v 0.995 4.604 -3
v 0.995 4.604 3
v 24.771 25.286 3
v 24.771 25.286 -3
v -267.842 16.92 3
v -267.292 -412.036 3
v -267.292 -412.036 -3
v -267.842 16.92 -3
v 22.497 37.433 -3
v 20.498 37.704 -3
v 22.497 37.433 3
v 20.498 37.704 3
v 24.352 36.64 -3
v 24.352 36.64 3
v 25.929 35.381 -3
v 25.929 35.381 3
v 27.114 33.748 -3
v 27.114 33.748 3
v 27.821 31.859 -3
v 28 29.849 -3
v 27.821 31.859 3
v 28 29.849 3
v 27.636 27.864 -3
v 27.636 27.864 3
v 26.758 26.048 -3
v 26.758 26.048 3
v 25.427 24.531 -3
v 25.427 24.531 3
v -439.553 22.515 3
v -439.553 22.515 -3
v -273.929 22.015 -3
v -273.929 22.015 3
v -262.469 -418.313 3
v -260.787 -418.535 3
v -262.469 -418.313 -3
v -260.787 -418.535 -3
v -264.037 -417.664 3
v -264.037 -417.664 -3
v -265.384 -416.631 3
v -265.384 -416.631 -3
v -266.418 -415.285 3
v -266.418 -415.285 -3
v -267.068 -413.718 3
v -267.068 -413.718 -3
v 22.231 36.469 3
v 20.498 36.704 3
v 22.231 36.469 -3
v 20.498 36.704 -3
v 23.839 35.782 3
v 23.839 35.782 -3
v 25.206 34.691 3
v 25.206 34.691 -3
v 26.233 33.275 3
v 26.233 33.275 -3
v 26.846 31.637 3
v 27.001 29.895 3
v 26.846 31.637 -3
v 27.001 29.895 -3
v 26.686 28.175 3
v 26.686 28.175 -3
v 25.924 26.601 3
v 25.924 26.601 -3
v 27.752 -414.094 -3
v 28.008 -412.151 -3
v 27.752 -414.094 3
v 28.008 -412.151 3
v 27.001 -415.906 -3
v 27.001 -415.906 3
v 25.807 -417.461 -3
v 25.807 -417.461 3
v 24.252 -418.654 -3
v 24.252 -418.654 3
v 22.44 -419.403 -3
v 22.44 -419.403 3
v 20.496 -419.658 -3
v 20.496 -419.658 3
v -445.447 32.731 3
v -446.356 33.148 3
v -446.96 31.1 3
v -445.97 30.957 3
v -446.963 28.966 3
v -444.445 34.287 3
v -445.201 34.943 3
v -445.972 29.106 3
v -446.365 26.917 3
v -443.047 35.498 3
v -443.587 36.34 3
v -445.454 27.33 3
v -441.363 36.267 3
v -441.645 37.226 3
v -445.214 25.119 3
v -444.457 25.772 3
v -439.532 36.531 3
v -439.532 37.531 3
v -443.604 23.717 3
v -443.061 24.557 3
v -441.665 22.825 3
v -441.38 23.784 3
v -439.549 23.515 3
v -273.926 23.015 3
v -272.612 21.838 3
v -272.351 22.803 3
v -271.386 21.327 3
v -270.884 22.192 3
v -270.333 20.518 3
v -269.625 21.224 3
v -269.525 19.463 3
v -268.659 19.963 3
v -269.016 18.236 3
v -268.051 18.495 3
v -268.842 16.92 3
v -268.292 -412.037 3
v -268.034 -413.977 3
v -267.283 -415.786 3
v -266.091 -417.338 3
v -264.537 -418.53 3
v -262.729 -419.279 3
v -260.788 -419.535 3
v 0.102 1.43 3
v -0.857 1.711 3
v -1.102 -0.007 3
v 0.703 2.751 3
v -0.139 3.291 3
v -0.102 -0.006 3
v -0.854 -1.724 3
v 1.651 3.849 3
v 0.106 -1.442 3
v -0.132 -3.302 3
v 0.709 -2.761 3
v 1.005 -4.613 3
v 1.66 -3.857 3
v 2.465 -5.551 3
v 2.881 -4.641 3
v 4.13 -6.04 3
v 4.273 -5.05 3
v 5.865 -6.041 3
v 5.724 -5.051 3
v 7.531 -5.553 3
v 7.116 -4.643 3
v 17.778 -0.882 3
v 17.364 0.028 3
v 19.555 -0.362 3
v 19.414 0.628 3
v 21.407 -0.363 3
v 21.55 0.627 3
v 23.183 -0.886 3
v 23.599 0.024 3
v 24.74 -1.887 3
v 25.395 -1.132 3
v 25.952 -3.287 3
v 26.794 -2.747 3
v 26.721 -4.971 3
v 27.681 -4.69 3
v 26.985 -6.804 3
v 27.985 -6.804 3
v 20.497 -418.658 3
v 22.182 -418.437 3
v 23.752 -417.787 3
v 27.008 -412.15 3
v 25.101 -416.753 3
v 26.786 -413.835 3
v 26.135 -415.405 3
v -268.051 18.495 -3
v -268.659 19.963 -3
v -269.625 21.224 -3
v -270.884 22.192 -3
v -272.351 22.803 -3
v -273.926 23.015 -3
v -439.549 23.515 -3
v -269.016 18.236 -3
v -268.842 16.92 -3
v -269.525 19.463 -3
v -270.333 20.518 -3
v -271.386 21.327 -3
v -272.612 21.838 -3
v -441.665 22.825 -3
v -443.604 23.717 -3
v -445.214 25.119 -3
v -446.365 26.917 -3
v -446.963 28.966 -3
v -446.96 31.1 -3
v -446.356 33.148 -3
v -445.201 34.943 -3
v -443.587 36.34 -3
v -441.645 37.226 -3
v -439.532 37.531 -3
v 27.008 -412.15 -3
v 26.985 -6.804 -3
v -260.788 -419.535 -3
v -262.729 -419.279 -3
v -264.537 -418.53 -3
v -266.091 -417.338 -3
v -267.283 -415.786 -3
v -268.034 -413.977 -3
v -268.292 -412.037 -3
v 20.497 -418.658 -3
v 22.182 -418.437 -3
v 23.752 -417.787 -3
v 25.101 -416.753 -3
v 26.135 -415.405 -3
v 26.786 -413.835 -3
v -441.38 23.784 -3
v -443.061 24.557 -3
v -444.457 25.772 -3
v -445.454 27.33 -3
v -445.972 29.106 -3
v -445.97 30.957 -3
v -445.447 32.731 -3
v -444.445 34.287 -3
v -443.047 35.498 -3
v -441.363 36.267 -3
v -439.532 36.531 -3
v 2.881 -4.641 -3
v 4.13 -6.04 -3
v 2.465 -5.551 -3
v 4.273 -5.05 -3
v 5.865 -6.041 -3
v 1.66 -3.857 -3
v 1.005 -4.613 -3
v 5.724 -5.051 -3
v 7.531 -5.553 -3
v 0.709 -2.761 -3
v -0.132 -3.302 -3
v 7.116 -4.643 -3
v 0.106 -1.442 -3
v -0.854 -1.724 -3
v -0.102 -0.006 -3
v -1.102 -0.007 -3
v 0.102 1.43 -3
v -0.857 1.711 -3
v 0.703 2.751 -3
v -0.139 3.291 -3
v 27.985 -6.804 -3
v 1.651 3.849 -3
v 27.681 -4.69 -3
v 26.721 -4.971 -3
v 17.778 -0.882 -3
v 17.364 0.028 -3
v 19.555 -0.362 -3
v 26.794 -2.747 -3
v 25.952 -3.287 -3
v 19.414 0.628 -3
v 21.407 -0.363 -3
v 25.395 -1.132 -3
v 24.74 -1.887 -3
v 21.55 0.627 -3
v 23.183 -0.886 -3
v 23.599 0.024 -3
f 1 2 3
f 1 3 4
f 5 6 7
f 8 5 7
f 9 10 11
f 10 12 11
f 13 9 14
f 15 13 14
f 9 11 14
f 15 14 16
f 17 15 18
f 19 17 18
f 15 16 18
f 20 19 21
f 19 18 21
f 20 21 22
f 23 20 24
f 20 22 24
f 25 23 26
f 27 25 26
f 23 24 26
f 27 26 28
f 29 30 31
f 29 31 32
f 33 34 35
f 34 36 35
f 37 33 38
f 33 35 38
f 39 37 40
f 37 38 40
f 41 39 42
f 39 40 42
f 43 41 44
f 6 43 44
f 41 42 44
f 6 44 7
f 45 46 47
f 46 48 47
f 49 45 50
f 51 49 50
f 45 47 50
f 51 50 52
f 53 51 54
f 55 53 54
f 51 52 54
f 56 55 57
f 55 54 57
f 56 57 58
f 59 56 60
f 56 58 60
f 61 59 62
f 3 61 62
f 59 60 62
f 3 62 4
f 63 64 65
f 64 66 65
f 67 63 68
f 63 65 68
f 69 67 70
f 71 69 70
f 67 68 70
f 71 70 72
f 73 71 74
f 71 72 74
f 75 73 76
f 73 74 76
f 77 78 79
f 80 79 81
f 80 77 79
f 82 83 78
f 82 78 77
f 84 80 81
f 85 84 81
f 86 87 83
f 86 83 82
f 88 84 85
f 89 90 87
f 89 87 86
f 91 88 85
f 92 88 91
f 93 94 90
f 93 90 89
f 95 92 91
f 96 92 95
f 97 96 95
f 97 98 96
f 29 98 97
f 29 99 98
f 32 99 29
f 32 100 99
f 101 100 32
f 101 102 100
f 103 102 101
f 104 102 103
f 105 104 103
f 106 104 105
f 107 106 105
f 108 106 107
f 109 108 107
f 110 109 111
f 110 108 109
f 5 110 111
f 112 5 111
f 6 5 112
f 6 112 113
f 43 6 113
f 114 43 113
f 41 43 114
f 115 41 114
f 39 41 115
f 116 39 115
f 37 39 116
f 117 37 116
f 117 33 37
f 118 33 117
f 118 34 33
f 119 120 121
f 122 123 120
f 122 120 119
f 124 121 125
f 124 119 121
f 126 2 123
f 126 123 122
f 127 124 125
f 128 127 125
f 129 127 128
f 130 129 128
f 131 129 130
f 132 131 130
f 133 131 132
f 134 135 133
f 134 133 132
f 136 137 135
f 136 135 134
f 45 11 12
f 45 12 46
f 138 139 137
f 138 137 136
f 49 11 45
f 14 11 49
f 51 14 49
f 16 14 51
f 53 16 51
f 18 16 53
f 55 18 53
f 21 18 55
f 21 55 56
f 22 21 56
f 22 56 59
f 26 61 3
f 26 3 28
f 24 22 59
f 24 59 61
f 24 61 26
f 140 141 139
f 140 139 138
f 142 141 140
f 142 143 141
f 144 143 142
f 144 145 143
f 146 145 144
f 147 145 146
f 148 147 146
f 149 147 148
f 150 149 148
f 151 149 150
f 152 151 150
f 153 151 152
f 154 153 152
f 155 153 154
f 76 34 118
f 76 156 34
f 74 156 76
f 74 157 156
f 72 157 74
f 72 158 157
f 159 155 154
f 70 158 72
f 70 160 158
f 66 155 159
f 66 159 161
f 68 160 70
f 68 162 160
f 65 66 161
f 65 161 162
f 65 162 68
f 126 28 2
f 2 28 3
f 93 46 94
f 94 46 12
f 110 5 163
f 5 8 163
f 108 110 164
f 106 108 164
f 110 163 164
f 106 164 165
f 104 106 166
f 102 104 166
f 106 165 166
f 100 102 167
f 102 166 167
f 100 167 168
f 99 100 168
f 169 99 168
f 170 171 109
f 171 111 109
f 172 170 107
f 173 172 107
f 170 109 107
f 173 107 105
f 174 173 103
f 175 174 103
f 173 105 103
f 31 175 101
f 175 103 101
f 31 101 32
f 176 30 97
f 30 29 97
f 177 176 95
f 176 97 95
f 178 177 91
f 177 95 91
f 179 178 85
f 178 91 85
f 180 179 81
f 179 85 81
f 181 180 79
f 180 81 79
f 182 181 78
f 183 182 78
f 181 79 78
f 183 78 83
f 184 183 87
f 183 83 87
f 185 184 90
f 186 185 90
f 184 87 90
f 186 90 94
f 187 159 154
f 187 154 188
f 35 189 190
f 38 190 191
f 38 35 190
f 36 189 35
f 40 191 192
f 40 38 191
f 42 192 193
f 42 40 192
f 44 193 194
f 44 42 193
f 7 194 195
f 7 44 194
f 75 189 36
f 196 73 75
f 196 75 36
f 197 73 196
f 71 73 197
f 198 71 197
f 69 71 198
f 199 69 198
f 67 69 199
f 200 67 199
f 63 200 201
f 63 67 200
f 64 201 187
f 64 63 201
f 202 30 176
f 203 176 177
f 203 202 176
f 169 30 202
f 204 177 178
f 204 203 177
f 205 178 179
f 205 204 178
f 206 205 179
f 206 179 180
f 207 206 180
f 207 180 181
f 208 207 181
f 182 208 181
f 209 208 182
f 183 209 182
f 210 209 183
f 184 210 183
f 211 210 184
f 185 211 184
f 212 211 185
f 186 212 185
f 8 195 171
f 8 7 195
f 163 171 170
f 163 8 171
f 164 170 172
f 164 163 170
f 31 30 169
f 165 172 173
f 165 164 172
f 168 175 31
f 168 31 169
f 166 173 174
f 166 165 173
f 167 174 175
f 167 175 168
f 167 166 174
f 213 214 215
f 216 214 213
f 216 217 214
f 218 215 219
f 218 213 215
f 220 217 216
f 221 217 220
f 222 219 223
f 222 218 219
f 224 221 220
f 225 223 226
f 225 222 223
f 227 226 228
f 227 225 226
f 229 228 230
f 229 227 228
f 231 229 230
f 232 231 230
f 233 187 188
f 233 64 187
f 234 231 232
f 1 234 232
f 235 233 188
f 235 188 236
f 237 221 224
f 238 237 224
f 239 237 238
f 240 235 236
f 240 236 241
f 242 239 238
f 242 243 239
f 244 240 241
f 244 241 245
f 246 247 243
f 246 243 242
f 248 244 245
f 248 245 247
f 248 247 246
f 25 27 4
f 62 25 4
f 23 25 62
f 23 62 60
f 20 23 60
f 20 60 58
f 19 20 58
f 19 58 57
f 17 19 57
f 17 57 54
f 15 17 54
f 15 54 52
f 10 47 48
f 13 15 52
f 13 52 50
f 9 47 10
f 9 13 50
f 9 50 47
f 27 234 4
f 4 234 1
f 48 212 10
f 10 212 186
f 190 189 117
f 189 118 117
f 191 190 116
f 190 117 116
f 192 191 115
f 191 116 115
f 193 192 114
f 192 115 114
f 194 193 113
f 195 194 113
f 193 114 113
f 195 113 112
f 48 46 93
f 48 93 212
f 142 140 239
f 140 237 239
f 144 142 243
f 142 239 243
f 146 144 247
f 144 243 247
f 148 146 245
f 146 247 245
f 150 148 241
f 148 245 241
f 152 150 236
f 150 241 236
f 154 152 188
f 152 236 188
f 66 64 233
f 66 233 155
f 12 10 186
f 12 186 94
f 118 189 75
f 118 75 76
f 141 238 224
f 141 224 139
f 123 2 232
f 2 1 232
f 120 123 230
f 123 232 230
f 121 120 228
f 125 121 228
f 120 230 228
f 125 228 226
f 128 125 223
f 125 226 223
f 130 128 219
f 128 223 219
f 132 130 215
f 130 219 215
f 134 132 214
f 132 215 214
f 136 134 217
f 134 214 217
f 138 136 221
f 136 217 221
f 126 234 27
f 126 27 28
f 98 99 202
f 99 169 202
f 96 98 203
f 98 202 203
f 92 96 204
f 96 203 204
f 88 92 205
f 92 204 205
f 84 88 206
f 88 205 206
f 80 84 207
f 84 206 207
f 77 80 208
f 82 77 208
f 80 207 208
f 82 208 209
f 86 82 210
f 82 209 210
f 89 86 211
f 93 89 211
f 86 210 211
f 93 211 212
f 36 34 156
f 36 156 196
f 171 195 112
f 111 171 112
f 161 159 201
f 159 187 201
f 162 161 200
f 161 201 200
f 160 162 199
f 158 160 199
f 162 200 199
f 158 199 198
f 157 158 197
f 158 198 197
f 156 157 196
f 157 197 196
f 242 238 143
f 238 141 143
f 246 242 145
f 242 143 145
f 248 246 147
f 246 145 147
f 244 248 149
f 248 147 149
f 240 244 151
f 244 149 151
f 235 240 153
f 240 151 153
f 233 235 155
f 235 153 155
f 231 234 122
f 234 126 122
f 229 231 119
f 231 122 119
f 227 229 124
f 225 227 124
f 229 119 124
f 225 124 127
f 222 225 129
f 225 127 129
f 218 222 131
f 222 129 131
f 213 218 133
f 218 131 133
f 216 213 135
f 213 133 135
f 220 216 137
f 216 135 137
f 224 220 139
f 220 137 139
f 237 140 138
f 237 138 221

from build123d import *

# Parameters (mm, degrees)
SKETCH3_W = 6
SKETCH3_H = 1


with BuildPart() as part:
    # Sweep1: sweep along a path in Sketch2
    with BuildLine(Plane.XY) as sweep1_path:
        Line((7.533930162, -5.559792976), (17.781318169, -0.889445417))
        ThreePointArc((17.781318169, -0.889445417), (23.99309151, -1.337216564), (26.976988544, -6.803749792))
        Line((26.976988544, -6.803749792), (26.99999999, -412.150308572))
        ThreePointArc((26.99999999, -412.150308572), (25.095317263, -416.747748302), (20.497151225, -418.650676952))
        Line((20.497151225, -418.650676952), (-260.786858168, -418.527397737))
        ThreePointArc((-260.786858168, -418.527397737), (-265.378263623, -416.625531469), (-267.28400405, -412.035732696))
        Line((-267.28400405, -412.035732696), (-267.834014416, 16.920435322))
        ThreePointArc((-267.834014416, 16.920435322), (-269.61983276, 21.229266015), (-273.925552043, 23.022573168))
        Line((-273.925552043, 23.022573168), (-439.549241213, 23.522898593))
        ThreePointArc((-439.549241213, 23.522898593), (-446.029600051, 30.031464399), (-439.53205031, 36.522868475))
        Line((-439.53205031, 36.522868475), (20.497555424, 36.695880369))
        ThreePointArc((20.497555424, 36.695880369), (26.58757217, 32.474359504), (24.7659723, 25.291649968))
        Line((24.7659723, 25.291649968), (0.989986039, 4.609977009))
        ThreePointArc((0.989986039, 4.609977009), (-0.138167108, -3.306257517), (7.533930162, -5.559792976))
    # Sketch3 → Sweep1 (sweep)
    with BuildSketch(Plane(origin=(0, 0, 0), x_dir=(0, 0, -1), z_dir=(1, 0, 0))):
        with Locations((0, 37.195880369)):
            Rectangle(SKETCH3_W, SKETCH3_H)
    sweep(path=sweep1_path.line)


solid = part.part
